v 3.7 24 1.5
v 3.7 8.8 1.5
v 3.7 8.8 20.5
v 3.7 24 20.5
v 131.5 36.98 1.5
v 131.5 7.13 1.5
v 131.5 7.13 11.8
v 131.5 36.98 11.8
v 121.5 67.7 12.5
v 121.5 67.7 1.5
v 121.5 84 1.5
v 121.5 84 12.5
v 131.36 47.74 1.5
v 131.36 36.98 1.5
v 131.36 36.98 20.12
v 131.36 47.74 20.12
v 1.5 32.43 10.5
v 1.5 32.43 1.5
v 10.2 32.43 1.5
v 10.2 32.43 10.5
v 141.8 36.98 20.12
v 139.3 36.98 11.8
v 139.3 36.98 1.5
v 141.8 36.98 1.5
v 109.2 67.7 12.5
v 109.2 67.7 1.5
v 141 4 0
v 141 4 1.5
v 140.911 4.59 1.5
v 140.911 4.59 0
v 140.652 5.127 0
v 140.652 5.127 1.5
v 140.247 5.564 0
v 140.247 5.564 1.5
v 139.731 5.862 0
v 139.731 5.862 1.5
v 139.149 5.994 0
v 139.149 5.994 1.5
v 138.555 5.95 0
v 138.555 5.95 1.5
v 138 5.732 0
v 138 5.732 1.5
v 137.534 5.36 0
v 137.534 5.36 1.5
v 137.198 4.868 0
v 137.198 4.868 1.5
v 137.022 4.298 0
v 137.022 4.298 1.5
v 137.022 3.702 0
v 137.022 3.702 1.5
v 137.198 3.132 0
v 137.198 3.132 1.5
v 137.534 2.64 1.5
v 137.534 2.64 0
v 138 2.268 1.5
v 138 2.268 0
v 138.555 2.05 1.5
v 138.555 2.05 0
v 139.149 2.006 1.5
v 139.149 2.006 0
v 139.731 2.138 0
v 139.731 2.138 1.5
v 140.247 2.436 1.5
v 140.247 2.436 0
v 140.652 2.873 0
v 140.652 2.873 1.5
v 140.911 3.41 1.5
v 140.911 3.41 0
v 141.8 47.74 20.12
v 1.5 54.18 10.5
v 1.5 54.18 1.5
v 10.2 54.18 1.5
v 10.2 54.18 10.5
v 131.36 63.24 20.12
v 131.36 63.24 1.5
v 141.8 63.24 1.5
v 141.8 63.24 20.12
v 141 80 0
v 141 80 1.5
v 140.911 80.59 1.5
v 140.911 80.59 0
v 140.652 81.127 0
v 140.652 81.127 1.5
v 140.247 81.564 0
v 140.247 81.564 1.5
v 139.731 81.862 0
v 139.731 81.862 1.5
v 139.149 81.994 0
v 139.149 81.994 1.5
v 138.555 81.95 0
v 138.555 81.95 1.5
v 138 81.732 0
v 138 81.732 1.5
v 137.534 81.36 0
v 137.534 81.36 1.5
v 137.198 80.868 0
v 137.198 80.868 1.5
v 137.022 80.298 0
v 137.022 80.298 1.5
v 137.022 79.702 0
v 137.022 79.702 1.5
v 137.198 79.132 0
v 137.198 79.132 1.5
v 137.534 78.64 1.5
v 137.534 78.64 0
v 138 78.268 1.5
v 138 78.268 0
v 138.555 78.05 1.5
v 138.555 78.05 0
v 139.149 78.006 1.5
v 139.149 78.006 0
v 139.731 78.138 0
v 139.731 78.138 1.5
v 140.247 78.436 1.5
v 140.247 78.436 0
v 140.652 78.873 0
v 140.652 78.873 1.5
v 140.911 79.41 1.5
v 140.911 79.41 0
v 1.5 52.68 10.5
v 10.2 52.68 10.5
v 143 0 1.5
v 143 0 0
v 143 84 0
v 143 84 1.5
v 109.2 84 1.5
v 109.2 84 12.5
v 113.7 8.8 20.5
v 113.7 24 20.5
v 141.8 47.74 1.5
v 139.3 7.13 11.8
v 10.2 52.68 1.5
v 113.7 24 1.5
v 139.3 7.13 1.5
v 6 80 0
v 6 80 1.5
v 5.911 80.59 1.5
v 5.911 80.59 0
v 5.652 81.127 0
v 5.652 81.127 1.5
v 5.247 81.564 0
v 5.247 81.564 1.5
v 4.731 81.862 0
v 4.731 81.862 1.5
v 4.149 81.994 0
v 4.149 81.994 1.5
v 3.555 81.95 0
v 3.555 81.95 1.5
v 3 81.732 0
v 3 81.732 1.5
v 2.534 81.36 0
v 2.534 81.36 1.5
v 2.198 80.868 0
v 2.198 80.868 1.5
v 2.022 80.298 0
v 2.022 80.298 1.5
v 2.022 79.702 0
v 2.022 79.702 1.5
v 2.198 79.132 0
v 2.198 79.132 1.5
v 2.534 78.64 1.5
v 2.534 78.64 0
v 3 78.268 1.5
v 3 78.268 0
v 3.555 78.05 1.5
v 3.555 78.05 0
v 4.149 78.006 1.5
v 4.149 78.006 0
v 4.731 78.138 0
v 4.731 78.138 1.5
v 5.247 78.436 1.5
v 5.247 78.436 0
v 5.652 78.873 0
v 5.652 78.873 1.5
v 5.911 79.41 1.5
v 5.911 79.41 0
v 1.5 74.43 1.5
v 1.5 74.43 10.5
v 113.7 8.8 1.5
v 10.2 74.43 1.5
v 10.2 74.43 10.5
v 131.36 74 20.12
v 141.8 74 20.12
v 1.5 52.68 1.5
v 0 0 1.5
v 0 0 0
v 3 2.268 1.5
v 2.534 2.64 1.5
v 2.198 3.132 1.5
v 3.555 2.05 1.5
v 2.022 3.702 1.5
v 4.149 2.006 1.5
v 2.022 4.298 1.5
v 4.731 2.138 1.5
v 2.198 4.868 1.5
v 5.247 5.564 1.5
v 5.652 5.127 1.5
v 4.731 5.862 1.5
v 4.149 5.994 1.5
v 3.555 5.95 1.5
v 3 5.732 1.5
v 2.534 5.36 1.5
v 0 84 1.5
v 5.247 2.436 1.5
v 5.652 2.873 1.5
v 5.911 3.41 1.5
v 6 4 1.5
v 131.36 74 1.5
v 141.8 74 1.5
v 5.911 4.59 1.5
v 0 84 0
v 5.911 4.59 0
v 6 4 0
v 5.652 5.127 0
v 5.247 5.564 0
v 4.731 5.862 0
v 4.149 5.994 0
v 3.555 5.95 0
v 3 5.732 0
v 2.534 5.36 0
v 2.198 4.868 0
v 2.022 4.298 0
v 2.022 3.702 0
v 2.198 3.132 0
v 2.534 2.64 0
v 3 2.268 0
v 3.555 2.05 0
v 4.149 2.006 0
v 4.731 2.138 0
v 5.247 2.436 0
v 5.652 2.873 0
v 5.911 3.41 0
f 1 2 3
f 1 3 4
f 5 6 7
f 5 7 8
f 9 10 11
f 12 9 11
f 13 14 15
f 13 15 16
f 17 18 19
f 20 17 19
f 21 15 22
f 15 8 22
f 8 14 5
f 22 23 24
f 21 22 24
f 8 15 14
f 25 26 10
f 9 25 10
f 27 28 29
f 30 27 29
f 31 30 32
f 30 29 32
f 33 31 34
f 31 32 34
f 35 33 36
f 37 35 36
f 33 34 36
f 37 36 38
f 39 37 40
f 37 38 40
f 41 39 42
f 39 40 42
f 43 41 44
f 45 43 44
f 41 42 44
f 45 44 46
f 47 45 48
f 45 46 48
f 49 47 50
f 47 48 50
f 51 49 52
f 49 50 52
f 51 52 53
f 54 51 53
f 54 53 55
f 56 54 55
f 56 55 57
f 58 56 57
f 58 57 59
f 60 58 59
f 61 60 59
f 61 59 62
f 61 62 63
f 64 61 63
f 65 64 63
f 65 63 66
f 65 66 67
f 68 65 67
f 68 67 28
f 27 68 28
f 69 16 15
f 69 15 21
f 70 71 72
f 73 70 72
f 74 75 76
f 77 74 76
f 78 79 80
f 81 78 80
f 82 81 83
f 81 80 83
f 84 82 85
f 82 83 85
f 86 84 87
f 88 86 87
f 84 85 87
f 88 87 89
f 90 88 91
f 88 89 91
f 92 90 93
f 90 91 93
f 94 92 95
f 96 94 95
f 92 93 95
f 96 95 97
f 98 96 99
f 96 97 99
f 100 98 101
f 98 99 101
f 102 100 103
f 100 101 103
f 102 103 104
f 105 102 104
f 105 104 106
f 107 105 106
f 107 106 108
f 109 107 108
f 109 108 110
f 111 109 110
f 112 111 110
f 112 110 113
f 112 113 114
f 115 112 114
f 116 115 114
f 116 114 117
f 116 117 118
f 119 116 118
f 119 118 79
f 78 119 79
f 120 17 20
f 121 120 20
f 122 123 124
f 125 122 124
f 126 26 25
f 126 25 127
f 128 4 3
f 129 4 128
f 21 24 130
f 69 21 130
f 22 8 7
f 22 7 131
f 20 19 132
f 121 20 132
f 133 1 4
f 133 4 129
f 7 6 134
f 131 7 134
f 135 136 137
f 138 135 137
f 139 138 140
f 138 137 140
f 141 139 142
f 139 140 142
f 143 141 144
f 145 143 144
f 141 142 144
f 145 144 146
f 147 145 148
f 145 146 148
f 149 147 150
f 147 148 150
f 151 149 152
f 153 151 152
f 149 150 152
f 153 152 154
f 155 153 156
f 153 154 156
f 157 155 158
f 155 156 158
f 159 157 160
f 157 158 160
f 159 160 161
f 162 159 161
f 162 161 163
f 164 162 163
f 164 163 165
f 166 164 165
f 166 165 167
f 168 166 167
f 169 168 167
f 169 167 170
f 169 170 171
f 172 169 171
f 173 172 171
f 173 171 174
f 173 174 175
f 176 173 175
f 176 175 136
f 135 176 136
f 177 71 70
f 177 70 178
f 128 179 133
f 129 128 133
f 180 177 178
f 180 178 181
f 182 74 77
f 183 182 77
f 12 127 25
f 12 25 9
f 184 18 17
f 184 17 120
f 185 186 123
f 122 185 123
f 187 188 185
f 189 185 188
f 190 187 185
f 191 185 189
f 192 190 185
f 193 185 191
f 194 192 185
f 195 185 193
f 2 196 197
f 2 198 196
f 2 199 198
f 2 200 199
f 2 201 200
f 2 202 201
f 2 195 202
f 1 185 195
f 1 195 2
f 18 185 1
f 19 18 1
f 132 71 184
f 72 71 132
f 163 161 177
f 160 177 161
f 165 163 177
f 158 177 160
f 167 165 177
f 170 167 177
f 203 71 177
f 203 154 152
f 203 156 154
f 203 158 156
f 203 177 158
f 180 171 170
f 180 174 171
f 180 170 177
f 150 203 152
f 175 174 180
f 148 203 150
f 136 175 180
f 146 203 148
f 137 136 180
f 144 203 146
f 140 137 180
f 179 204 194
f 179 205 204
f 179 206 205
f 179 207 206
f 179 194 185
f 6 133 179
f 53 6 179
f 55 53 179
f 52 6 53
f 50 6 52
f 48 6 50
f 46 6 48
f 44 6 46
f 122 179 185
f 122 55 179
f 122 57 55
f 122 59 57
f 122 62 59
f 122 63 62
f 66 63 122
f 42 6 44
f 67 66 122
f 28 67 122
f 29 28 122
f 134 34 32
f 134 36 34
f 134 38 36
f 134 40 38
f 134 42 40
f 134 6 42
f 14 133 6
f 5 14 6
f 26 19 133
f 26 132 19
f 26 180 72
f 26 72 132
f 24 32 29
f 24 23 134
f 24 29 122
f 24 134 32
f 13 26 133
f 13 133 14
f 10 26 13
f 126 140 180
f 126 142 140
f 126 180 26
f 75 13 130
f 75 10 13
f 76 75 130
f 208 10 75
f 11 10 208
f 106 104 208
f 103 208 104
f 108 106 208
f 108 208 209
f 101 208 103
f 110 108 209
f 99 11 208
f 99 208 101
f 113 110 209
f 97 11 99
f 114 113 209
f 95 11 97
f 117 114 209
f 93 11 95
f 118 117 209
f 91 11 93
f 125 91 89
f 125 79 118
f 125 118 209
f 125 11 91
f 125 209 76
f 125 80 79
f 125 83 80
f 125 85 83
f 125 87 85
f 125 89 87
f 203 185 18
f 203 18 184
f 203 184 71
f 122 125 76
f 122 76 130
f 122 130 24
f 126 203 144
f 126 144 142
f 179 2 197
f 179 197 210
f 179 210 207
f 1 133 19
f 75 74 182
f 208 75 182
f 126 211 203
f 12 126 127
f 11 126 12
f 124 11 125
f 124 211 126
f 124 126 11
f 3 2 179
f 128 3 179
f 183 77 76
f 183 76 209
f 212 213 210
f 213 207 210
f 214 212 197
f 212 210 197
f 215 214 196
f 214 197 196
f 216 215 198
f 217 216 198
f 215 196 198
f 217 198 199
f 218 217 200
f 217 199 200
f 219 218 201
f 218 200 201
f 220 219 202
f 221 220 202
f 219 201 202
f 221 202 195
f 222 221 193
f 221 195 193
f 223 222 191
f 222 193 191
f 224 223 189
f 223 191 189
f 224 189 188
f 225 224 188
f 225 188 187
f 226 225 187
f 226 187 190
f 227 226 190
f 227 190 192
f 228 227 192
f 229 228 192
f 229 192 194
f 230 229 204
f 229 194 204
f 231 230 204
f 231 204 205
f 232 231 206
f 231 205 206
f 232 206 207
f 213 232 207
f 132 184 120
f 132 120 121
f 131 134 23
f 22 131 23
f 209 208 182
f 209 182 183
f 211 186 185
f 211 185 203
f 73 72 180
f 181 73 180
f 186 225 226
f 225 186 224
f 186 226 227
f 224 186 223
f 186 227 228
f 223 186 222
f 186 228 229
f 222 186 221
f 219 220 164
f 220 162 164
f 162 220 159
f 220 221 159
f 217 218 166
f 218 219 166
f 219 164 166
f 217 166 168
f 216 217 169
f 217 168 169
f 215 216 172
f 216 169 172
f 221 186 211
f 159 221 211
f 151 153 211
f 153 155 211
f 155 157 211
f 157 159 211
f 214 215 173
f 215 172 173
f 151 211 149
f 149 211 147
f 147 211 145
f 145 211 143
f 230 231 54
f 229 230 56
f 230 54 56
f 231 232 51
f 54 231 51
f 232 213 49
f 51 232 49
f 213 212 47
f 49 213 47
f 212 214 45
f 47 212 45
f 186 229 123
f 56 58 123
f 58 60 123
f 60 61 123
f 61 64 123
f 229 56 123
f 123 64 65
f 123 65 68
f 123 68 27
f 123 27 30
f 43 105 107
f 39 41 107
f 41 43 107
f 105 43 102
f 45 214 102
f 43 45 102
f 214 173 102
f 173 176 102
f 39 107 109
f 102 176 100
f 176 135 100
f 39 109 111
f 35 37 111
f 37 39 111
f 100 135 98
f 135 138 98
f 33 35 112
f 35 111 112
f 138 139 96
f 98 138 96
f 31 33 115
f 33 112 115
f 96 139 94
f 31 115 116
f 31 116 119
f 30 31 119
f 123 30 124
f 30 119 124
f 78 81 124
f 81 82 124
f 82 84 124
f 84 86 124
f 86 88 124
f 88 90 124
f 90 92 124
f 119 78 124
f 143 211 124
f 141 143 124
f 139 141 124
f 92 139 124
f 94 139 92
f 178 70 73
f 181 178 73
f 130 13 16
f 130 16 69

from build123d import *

# Parameters (mm, degrees)
F0_W      = 143
F0_H      = 84
F1_DEPTH  = 1.5
F2_R      = 2
F3_DEPTH  = 12.5
F4_W      = 10.44
F4_H      = 10.76
F5_DEPTH  = 18.62
F6_W      = 7.8
F6_H      = 30
F7_DEPTH  = 10.3
F8_W      = 8.7
F8_H      = 20.25
F9_DEPTH  = 9
F10_W     = 110
F10_H     = 15.2
F11_DEPTH = 19
F12_W     = 12.3
F12_H     = 16.3
F13_DEPTH = 11


with BuildPart() as f1:
    # F0 (on Top) → F1 (new body)
    with BuildSketch(Plane.XY):
        with Locations((71.5, 42)):
            Rectangle(F0_W, F0_H)
    extrude(amount=F1_DEPTH)

    # F2 (on face) → F3 (cut, symmetric)
    with BuildSketch(Plane.XY.offset(1.5)):
        with Locations((139, 4)):
            Circle(F2_R)
        with Locations((139, 80)):
            Circle(F2_R)
        with Locations((4, 80)):
            Circle(F2_R)
        with Locations((4, 4)):
            Circle(F2_R)
    extrude(amount=F3_DEPTH, both=True, mode=Mode.SUBTRACT)

    # F4 (on face) → F5 (join)
    with BuildSketch(Plane.XY.offset(1.5)):
        with Locations((136.58, 68.62)):
            Rectangle(F4_W, F4_H)
        with Locations((136.58, 42.36)):
            Rectangle(F4_W, F4_H)
    extrude(amount=F5_DEPTH)

    # F6 (on face) → F7 (join)
    with BuildSketch(Plane.XY.offset(1.5)):
        with Locations((135.4, 22.13)):
            Rectangle(F6_W, F6_H)
    extrude(amount=F7_DEPTH)

    # F8 (on face) → F9 (join)
    with BuildSketch(Plane.XY.offset(1.5)):
        with Locations((5.85, 64.305)):
            Rectangle(F8_W, F8_H)
        with Locations((5.85, 42.555)):
            Rectangle(F8_W, F8_H)
    extrude(amount=F9_DEPTH)

    # F10 (on face) → F11 (join)
    with BuildSketch(Plane.XY.offset(1.5)):
        with Locations((58.7, 16.4)):
            Rectangle(F10_W, F10_H)
    extrude(amount=F11_DEPTH)

    # F12 (on face) → F13 (join)
    with BuildSketch(Plane.XY.offset(1.5)):
        with Locations((115.35, 75.85)):
            Rectangle(F12_W, F12_H)
    extrude(amount=F13_DEPTH)


solid = f1.part
